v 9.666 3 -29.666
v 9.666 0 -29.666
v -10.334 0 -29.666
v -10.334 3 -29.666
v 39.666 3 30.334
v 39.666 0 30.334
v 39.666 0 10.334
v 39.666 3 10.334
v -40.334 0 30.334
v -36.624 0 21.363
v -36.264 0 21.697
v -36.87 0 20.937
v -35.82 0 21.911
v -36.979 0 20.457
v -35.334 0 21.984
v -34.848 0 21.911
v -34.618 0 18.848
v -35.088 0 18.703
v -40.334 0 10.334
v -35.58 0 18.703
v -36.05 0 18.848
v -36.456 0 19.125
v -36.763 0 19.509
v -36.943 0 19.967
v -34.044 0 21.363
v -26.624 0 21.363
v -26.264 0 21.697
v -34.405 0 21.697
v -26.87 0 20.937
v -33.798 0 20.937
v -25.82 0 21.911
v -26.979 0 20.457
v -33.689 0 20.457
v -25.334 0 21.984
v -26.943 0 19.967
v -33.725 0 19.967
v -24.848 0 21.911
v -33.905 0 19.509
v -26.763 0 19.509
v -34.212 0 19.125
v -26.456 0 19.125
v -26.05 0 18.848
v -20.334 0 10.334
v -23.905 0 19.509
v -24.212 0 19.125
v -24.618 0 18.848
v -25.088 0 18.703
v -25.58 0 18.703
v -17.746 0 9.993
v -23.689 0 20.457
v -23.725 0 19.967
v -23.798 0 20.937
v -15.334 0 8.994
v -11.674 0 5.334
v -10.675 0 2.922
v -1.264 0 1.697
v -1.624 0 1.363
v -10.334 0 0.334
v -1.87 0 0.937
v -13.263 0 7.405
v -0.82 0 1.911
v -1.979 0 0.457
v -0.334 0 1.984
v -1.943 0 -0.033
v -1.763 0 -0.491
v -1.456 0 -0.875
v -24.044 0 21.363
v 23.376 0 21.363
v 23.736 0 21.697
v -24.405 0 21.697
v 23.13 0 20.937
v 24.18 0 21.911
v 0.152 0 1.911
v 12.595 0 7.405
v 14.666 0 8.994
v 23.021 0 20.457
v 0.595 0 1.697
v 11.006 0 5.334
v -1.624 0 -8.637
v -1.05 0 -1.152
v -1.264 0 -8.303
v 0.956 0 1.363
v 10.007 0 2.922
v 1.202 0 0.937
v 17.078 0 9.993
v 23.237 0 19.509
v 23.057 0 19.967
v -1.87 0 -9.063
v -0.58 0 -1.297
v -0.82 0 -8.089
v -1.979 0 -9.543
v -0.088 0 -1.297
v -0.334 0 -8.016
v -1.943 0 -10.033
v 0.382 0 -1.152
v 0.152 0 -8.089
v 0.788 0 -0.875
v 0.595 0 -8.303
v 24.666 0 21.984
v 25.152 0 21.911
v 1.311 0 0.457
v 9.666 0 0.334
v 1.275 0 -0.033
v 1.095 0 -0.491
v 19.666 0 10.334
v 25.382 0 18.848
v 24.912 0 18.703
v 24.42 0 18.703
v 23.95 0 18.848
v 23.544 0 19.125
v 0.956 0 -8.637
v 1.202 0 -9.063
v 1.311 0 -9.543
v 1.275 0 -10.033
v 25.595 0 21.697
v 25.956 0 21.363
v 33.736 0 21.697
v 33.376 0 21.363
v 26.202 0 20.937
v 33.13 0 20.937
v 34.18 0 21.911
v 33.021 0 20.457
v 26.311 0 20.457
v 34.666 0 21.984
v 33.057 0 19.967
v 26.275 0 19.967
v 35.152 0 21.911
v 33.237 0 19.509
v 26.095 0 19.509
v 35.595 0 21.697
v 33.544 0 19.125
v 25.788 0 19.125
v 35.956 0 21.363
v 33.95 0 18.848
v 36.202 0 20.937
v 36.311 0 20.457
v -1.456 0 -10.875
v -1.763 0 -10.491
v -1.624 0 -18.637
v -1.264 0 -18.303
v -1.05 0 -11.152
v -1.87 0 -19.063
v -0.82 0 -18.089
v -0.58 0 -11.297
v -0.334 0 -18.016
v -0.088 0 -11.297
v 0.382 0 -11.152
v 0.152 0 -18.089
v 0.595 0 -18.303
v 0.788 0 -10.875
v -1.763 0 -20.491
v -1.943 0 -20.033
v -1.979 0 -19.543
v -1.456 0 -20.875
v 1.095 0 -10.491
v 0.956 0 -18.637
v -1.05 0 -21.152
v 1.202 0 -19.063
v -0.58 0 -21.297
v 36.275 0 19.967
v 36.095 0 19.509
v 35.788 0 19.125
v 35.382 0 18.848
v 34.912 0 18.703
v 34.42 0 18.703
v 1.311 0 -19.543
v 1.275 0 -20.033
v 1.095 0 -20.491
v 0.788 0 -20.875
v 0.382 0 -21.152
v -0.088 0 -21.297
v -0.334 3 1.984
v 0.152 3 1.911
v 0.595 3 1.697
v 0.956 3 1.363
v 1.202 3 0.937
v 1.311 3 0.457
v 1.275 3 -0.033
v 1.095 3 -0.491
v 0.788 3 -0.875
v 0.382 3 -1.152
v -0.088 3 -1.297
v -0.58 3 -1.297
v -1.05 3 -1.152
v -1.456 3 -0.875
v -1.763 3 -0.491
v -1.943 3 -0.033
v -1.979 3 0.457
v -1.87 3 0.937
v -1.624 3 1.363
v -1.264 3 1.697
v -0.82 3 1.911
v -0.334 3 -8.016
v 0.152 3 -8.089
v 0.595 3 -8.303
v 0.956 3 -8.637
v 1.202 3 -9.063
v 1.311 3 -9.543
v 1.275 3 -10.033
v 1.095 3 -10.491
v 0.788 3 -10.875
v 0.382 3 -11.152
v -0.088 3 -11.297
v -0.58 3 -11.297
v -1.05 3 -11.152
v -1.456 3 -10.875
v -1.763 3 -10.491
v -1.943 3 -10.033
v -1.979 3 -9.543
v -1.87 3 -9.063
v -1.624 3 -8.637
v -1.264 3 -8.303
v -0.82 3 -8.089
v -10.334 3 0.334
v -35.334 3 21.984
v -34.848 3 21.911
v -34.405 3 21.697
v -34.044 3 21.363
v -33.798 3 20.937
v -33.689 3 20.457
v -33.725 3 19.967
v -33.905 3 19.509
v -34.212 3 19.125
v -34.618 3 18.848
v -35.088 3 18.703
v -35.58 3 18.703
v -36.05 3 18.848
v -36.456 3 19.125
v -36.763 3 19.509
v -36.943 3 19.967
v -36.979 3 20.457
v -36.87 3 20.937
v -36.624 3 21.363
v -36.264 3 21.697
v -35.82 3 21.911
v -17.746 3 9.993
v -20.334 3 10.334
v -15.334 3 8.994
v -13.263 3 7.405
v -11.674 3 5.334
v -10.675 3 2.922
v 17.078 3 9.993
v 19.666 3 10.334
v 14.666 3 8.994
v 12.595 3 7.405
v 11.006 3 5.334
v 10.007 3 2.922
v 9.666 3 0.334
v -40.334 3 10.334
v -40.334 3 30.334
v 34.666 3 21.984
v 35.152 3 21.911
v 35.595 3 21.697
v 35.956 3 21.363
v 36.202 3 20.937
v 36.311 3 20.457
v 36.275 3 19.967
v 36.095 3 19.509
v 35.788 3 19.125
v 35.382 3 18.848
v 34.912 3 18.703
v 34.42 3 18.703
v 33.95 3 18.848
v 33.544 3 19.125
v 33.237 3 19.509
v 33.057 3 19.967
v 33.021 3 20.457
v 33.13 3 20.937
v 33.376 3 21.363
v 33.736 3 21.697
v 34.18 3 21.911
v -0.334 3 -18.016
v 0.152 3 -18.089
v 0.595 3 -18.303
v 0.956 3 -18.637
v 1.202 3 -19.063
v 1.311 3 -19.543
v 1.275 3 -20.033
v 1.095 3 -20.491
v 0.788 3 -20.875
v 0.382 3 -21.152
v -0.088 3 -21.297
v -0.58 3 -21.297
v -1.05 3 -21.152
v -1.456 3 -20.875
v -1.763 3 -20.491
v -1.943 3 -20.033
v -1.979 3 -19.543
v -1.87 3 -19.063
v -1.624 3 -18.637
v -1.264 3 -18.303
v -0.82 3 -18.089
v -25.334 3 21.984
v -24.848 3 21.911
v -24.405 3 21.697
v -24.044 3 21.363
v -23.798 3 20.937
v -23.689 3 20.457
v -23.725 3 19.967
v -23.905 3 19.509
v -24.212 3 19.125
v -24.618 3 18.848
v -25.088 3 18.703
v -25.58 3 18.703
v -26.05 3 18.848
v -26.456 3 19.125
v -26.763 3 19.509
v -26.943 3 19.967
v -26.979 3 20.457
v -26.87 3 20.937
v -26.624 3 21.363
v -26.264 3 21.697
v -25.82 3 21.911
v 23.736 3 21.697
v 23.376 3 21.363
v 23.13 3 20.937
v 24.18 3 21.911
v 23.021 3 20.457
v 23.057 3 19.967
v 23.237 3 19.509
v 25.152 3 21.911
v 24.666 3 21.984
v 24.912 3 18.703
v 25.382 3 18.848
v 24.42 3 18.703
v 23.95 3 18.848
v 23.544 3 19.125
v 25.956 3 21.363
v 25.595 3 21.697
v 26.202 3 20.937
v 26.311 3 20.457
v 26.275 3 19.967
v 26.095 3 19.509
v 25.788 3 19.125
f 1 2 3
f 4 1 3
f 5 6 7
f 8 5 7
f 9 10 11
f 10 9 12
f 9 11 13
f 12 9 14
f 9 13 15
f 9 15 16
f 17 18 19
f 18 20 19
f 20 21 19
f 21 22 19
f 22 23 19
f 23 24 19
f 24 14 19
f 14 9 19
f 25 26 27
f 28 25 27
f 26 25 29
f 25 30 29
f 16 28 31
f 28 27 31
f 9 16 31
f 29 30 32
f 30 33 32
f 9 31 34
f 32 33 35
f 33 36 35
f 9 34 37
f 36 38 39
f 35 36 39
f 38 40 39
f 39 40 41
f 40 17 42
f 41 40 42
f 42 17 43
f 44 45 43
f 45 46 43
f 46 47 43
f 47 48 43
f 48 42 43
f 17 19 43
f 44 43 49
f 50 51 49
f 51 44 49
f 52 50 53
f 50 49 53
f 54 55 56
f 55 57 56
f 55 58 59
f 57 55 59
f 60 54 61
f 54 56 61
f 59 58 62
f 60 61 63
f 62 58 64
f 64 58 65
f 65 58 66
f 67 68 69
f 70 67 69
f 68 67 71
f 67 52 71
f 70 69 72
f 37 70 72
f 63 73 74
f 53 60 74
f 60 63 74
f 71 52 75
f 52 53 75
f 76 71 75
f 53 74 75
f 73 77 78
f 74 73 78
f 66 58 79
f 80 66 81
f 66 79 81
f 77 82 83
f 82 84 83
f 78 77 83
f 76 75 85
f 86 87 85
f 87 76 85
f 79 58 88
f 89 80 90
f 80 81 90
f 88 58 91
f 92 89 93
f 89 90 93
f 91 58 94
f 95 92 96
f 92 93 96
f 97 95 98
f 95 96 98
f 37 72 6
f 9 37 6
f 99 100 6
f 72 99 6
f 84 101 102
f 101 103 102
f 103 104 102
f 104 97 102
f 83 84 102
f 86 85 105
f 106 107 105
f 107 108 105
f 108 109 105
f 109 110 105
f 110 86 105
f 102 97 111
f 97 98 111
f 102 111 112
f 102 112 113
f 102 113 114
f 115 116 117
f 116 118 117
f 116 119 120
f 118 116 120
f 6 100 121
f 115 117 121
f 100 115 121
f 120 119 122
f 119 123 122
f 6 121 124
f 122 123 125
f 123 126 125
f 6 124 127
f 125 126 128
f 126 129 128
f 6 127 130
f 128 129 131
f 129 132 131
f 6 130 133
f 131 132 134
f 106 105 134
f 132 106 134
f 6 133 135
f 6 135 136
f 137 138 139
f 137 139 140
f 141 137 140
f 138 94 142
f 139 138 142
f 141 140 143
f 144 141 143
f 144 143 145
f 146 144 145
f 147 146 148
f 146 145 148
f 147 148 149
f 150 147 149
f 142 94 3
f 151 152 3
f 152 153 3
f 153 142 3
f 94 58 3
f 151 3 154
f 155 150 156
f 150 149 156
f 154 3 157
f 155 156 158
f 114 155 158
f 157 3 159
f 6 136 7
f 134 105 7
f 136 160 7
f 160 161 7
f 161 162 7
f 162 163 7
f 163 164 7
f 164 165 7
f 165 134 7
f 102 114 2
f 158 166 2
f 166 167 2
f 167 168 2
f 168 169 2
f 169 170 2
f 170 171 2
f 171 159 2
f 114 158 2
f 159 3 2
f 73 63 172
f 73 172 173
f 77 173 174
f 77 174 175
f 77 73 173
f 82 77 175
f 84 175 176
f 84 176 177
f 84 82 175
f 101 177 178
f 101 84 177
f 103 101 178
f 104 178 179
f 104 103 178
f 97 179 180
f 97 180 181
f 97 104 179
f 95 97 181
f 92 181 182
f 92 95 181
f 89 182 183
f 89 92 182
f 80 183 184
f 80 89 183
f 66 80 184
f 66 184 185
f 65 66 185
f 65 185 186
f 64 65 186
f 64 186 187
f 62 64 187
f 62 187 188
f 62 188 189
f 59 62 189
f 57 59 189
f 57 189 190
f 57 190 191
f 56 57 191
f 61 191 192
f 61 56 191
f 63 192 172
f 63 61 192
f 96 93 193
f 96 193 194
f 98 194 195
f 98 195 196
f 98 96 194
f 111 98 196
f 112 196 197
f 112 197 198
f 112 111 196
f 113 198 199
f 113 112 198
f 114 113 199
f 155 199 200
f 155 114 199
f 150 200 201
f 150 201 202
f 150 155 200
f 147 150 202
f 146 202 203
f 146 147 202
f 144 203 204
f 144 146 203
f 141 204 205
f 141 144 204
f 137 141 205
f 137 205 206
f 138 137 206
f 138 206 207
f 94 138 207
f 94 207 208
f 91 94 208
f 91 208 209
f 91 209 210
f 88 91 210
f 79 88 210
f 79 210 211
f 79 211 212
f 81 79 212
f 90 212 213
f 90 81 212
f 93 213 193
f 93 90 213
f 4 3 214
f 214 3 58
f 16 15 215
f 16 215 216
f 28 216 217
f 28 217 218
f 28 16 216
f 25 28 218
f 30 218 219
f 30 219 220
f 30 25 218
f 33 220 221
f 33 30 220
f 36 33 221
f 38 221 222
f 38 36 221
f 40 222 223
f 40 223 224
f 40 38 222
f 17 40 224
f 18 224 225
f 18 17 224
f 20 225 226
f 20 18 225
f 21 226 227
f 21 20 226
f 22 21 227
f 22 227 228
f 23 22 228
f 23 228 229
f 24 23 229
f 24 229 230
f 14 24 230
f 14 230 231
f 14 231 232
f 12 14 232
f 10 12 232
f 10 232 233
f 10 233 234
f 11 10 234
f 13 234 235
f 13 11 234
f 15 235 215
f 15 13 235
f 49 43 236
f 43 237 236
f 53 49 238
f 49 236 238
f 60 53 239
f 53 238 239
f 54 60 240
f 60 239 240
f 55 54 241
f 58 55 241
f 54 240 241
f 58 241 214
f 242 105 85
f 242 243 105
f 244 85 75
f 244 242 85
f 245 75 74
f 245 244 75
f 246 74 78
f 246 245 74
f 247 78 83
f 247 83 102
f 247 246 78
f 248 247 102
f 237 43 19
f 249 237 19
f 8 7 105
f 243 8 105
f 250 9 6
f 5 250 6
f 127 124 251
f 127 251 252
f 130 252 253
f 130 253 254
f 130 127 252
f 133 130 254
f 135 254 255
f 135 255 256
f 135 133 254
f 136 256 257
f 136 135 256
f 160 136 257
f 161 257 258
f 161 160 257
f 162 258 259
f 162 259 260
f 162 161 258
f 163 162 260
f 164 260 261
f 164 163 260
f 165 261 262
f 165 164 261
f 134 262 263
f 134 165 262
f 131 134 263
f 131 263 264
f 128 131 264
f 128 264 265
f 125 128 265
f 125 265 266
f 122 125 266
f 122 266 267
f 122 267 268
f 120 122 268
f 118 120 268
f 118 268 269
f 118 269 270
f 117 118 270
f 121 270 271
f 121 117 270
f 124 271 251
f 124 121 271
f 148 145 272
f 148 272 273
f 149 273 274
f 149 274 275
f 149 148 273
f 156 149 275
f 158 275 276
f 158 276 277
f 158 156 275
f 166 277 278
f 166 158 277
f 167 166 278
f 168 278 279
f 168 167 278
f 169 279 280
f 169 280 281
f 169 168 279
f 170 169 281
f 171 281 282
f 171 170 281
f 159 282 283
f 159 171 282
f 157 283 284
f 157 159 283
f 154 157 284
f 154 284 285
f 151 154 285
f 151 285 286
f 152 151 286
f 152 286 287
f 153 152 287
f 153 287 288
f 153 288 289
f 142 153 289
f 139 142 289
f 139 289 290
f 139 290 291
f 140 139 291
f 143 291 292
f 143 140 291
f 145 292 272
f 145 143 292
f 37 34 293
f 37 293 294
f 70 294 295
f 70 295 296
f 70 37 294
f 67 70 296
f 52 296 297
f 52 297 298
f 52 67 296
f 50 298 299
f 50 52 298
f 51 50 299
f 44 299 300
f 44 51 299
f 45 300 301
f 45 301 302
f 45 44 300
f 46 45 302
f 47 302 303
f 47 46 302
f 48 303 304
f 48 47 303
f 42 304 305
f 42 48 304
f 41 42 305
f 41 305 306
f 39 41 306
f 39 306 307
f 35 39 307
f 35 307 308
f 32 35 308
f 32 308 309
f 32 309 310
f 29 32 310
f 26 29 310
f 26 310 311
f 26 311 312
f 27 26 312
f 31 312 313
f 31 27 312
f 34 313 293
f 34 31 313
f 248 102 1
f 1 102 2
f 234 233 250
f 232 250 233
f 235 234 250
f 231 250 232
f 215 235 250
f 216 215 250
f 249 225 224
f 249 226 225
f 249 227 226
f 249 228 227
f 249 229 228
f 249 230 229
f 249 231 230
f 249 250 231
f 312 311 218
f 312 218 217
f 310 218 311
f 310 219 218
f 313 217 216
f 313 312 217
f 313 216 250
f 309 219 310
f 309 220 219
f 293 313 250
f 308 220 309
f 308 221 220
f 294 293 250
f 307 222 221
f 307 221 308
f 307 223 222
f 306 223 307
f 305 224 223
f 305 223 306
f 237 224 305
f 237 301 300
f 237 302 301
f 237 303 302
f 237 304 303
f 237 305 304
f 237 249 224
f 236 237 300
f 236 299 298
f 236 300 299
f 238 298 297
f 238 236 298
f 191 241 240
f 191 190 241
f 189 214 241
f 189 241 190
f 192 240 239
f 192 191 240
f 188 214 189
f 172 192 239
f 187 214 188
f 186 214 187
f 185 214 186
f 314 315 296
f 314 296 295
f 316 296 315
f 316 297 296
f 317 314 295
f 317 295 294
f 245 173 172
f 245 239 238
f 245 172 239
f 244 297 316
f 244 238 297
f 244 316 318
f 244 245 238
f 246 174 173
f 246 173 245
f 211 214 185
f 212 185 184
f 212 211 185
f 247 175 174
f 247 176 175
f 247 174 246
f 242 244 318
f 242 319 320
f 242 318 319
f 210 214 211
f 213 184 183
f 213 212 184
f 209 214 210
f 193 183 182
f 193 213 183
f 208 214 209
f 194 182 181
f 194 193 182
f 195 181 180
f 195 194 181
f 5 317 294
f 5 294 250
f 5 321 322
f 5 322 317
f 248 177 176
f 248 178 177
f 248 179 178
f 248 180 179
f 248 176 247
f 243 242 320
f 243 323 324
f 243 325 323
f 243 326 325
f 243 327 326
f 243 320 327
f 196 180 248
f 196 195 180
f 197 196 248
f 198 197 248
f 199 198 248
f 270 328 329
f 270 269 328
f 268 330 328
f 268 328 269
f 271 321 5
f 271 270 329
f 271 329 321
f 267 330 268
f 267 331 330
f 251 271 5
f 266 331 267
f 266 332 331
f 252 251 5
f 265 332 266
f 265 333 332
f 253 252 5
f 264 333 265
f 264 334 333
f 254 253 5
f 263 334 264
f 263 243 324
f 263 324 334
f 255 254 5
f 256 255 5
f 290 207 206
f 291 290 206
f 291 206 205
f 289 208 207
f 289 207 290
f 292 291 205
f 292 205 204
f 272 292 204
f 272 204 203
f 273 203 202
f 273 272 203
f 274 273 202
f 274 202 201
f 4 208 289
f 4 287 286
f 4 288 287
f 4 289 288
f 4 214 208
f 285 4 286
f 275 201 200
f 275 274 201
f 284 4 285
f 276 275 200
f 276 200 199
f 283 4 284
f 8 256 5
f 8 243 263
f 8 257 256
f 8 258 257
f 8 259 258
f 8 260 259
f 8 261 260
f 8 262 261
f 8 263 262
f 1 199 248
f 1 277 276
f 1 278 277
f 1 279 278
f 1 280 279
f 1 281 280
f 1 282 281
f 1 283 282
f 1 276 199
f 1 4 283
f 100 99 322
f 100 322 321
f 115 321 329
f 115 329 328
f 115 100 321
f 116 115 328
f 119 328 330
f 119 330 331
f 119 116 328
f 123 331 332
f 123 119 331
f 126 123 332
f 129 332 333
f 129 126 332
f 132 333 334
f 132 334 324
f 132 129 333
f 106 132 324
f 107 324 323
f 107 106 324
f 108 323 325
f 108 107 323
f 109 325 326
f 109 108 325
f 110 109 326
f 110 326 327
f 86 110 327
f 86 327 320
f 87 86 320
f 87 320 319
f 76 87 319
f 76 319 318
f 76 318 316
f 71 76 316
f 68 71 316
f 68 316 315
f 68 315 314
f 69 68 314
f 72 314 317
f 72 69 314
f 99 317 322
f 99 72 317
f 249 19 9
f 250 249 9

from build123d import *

# Parameters (mm, degrees)
SKETCH_1_R      = 1.65
EXTRUDE_1_DEPTH = 3
FILLET_1_R      = 10


with BuildPart() as part:
    # 草图1 → 凸台-拉伸1 (new body)
    with BuildSketch(Plane(origin=(0, 0, 0), x_dir=(1, 0, 0), z_dir=(0, 1, 0))):
        Polygon((-40.334108275, -30.334108275), (39.665891725, -30.334108275), (39.665891725, -10.334108275), (9.665891725, -10.334108275), (9.665891725, 29.665891725), (-10.334108275, 29.665891725), (-10.334108275, -10.334108275), (-40.334108275, -10.334108275), align=None)
        with Locations(Location((-0.334108275, -0.334108275, 0), (0, 0, 270))):
            Circle(SKETCH_1_R, mode=Mode.SUBTRACT)
        with Locations(Location((-0.334108275, 9.665891725, 0), (0, 0, 270))):
            Circle(SKETCH_1_R, mode=Mode.SUBTRACT)
        with Locations(Location((-0.334108275, 19.665891725, 0), (0, 0, 270))):
            Circle(SKETCH_1_R, mode=Mode.SUBTRACT)
        with Locations(Location((-25.334108275, -20.334108275, 0), (0, 0, 270))):
            Circle(SKETCH_1_R, mode=Mode.SUBTRACT)
        with Locations(Location((-35.334108275, -20.334108275, 0), (0, 0, 270))):
            Circle(SKETCH_1_R, mode=Mode.SUBTRACT)
        with Locations(Location((24.665891725, -20.334108275, 0), (0, 0, 270))):
            Circle(SKETCH_1_R, mode=Mode.SUBTRACT)
        with Locations(Location((34.665891725, -20.334108275, 0), (0, 0, 270))):
            Circle(SKETCH_1_R, mode=Mode.SUBTRACT)
    extrude(amount=EXTRUDE_1_DEPTH)

    # 圆角1
    fillet_1_edges = [part.edges().sort_by_distance(p)[0] for p in [
        (-10.334108275, 1.5, 10.334108275),
        (9.665891725, 1.5, 10.334108275),
    ]]
    fillet(fillet_1_edges, radius=FILLET_1_R)


solid = part.part
